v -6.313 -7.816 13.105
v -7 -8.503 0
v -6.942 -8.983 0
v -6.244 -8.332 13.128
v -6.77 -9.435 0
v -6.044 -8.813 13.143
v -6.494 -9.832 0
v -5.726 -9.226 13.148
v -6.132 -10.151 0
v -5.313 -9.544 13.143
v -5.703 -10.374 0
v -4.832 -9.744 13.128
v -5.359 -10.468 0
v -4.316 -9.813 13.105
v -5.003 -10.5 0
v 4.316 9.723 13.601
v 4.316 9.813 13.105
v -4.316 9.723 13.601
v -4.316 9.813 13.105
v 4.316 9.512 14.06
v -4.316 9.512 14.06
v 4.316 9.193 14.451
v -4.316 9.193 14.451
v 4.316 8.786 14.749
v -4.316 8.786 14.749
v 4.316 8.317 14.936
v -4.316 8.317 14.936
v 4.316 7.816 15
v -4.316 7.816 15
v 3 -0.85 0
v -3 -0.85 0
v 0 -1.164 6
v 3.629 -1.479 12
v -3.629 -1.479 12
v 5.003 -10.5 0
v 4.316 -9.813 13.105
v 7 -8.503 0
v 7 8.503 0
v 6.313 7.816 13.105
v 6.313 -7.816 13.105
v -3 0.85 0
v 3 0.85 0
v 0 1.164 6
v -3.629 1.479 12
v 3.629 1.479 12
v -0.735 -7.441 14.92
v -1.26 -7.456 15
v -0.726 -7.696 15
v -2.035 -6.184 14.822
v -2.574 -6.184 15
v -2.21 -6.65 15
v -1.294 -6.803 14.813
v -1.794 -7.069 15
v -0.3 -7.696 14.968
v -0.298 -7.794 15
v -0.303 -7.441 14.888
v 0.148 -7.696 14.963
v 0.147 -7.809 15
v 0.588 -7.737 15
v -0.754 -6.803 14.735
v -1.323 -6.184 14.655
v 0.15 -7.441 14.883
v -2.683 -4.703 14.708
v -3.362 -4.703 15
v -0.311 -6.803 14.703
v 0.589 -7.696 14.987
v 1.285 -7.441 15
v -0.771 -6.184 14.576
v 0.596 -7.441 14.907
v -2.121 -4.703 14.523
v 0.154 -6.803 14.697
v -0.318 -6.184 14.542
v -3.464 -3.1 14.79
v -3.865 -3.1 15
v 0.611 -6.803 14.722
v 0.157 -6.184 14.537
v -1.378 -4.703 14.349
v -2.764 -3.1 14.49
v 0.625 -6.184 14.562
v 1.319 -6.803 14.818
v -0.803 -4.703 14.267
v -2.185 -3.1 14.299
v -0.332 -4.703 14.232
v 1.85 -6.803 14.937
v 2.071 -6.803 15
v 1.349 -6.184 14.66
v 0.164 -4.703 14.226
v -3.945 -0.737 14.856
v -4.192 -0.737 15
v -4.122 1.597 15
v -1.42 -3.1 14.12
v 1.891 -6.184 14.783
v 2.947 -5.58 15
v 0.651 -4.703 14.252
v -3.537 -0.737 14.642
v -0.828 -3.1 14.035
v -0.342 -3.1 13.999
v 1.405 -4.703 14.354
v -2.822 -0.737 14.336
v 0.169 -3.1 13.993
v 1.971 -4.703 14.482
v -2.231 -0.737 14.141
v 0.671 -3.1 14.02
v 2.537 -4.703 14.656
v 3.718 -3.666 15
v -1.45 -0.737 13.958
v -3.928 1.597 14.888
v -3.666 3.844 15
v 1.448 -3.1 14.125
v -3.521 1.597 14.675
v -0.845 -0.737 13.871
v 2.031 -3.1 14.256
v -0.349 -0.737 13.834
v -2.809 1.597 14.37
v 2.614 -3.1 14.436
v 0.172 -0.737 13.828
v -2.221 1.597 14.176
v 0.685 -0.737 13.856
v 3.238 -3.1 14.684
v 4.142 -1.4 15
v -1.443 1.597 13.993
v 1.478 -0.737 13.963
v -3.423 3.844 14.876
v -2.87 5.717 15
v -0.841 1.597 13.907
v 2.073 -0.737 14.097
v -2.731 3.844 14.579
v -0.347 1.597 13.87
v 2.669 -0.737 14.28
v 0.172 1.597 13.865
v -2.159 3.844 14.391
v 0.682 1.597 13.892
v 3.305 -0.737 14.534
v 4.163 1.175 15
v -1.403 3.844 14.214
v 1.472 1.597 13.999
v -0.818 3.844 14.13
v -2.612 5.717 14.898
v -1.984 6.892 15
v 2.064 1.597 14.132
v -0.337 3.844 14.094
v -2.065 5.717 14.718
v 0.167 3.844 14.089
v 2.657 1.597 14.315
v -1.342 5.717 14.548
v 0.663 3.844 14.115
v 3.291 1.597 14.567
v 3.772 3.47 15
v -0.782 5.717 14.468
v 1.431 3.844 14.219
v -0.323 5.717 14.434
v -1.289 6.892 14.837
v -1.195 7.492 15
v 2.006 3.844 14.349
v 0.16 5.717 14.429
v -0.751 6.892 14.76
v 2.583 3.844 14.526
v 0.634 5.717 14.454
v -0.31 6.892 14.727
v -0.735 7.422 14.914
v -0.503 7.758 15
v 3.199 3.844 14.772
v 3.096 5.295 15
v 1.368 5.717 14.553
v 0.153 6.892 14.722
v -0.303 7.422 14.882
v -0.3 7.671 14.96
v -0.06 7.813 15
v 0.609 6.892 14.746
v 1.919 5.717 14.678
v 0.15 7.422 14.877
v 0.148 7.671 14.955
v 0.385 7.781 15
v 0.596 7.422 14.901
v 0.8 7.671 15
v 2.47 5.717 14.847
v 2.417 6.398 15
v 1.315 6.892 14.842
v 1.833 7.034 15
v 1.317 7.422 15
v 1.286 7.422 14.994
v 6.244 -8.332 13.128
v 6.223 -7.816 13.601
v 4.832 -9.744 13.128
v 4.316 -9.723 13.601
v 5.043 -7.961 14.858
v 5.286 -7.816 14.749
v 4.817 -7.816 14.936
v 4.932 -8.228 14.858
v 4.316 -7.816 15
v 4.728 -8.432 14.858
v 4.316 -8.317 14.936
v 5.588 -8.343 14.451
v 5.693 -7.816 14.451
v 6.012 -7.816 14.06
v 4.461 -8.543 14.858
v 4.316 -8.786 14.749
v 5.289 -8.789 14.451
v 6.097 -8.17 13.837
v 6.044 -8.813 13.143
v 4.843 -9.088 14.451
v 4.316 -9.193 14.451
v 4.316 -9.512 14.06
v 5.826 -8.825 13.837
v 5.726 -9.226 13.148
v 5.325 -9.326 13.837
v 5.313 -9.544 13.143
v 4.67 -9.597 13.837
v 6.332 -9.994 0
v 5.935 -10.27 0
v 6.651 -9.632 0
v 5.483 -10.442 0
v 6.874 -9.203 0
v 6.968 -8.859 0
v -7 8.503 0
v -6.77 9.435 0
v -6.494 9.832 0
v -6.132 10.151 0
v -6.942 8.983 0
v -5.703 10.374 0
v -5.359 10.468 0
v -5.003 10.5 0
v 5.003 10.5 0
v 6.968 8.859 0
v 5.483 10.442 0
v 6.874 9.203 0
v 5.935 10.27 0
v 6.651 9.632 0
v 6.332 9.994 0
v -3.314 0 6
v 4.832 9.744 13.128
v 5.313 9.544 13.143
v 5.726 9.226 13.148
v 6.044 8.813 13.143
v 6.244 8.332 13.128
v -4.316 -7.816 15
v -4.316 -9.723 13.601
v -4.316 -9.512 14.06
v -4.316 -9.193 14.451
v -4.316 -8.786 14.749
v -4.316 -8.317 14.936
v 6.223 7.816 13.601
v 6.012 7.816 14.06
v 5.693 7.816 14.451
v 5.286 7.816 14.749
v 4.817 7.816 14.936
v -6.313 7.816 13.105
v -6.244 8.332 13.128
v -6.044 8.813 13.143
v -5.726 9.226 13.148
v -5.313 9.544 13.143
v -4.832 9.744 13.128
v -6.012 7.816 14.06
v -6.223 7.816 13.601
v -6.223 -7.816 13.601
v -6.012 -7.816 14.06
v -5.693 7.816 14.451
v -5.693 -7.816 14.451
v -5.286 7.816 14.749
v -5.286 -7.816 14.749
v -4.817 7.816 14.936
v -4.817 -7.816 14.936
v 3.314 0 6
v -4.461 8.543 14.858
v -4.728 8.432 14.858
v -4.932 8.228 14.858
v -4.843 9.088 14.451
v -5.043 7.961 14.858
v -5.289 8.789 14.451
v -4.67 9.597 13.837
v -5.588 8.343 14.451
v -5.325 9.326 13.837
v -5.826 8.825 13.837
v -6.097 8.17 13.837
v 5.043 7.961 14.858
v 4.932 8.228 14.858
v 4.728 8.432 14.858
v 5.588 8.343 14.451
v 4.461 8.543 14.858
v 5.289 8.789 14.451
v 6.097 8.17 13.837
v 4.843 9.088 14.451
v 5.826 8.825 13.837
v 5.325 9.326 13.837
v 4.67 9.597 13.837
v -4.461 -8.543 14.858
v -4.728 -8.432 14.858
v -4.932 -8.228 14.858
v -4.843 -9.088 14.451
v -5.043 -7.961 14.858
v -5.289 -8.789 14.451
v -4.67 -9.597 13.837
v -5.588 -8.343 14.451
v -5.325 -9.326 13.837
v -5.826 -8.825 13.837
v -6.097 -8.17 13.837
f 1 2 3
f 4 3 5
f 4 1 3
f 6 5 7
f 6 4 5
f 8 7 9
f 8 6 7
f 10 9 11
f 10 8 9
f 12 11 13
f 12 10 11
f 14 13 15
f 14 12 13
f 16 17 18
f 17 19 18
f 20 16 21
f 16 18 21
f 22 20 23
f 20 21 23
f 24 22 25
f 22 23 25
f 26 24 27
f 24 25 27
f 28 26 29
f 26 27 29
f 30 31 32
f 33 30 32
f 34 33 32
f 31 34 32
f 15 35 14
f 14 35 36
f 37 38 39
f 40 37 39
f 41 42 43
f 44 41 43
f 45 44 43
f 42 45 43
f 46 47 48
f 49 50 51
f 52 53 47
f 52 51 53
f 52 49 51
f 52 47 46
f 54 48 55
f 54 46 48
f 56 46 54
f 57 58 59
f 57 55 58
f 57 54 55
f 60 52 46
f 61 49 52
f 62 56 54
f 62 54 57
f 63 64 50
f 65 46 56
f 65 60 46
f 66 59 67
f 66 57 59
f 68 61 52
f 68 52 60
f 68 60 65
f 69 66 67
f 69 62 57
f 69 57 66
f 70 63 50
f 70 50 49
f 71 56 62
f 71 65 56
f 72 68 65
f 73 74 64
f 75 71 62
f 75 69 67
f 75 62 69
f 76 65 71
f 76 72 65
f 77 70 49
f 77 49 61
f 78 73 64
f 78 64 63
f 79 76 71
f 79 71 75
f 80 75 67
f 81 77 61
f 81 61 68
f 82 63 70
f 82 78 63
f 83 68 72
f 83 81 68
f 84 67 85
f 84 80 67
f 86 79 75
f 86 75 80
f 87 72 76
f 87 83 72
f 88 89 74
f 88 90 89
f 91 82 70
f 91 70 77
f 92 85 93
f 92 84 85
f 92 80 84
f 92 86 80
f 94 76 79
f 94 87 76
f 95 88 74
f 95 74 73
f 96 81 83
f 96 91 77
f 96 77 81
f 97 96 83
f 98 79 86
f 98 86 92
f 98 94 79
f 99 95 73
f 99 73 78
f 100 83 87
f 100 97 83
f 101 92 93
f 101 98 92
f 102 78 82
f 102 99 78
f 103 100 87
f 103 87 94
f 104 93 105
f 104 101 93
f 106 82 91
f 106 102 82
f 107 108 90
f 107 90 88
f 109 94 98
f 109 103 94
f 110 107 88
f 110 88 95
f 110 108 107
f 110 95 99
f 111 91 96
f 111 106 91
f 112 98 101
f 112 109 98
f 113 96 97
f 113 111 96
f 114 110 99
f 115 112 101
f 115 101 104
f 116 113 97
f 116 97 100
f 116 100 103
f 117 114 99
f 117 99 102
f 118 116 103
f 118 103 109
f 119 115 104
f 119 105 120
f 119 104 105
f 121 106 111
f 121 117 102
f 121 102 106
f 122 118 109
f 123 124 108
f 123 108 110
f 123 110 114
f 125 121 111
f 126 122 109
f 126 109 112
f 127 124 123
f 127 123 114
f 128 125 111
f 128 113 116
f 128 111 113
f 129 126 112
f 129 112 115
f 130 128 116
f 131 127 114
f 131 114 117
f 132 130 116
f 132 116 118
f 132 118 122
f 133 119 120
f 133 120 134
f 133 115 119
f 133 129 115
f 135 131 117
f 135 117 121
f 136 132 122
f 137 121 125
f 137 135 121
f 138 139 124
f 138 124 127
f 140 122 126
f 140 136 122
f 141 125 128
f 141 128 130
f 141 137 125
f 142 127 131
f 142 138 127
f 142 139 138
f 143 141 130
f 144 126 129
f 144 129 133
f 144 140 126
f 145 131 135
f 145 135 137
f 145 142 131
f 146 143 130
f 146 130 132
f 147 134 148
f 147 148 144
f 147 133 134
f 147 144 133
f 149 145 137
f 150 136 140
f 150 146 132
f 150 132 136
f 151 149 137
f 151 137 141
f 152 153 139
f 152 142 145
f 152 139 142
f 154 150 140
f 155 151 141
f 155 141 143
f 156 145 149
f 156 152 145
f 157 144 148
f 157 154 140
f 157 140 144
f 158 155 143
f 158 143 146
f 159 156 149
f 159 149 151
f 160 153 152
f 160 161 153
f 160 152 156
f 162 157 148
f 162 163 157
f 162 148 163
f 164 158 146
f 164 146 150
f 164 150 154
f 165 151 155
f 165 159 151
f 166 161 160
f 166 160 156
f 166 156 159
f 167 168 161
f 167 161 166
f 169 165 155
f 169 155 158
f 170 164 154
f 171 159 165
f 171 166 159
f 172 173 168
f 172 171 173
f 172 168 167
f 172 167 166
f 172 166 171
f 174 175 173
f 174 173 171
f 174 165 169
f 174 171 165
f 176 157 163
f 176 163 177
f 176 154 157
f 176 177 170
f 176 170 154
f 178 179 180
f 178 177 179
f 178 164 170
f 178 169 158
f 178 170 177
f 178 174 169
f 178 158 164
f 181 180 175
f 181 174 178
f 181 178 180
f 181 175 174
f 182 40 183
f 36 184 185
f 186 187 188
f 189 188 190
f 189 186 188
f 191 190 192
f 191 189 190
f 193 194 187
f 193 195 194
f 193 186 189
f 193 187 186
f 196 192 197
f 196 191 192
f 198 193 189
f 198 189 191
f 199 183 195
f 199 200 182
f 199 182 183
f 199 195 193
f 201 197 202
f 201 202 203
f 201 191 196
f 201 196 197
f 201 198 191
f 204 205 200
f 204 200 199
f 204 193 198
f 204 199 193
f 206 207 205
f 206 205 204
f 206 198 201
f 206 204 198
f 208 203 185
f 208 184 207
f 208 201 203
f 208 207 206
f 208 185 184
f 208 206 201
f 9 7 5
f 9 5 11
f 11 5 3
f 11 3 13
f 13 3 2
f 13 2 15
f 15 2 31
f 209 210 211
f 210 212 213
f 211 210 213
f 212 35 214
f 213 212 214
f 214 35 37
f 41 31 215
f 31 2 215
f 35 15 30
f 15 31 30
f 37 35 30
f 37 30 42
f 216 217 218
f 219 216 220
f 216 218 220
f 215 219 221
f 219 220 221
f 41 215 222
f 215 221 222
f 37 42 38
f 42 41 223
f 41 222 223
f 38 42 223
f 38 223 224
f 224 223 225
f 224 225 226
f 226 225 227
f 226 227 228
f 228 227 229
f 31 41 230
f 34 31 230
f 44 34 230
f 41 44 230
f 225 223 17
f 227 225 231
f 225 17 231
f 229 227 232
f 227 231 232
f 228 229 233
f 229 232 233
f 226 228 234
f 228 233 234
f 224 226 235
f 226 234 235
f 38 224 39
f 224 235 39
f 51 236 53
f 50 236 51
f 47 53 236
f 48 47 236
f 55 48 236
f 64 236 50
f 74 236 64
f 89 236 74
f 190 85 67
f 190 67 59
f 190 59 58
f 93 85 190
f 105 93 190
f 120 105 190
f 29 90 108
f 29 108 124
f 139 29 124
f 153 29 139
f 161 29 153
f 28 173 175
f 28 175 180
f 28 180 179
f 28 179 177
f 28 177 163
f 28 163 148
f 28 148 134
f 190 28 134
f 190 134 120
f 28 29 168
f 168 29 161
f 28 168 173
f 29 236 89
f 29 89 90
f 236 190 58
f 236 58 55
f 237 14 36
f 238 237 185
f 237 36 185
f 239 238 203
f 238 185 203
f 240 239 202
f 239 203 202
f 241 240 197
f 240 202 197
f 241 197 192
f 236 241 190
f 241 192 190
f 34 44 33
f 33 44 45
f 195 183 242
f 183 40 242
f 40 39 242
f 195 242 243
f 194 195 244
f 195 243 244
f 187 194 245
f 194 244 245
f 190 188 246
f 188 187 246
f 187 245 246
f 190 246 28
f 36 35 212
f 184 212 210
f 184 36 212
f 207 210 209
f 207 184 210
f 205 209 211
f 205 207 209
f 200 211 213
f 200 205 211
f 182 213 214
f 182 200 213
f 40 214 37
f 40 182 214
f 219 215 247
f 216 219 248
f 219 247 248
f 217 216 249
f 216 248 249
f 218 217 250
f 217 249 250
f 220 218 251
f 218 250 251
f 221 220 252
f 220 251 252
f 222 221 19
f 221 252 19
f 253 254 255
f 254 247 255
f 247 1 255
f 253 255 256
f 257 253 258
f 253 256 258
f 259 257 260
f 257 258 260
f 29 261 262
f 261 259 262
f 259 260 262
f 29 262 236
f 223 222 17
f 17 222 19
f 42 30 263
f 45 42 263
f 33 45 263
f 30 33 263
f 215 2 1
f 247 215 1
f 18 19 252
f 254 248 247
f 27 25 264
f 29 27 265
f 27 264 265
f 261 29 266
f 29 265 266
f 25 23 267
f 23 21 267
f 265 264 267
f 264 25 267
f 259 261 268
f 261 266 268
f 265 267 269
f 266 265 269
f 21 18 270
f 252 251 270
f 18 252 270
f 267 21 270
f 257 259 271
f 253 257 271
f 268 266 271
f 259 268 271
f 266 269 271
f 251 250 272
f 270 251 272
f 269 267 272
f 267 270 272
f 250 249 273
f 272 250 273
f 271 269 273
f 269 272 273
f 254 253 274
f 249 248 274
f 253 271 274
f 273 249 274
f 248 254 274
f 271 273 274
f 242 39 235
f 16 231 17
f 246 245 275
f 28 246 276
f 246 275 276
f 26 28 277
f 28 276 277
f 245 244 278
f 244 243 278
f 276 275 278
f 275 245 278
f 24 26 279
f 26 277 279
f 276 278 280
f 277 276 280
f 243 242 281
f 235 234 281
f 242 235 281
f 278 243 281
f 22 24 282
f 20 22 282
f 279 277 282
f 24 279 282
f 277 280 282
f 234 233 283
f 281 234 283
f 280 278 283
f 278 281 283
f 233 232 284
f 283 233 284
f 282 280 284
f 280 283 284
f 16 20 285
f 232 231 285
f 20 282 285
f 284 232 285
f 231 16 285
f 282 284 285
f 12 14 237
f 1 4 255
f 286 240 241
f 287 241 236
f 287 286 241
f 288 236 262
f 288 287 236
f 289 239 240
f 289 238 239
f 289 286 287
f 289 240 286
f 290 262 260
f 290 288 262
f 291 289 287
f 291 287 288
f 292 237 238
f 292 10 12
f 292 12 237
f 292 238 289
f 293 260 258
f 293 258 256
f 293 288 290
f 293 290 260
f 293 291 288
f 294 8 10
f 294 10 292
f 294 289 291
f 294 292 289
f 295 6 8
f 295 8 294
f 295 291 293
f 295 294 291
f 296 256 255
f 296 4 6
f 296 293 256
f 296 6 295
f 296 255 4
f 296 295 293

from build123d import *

# Parameters (mm, degrees)
F0_W     = 14
F0_H     = 21
F0_W_2   = 6
F0_H_2   = 1.7
F1_DEPTH = 15
F1_TAPER = 3
F2_DEPTH = 12
F2_TAPER = -3
F3_R     = 2


with BuildPart() as f1:
    # F0 (on Top) → F1 (new body)
    with BuildSketch(Plane.XY):
        Rectangle(F0_W, F0_H)
        Rectangle(F0_W_2, F0_H_2, mode=Mode.SUBTRACT)
        Rectangle(F0_W_2, F0_H_2)
    extrude(amount=F1_DEPTH, taper=F1_TAPER)

    # F0 (on Top) → F2 (cut)
    with BuildSketch(Plane.XY):
        Rectangle(F0_W_2, F0_H_2)
    extrude(amount=F2_DEPTH, taper=F2_TAPER, mode=Mode.SUBTRACT)

    # F3
    f3_edges = [f1.edges().sort_by_distance(p)[0] for p in [
        (-6.606942, 10.106942, 7.5),
        (-6.606942, -10.106942, 7.5),
        (6.606942, 10.106942, 7.5),
        (6.606942, -10.106942, 7.5),
        (6.213883, 0, 15),
        (0, -9.713883, 15),
        (0, 9.713883, 15),
        (-6.213883, 0, 15),
    ]]
    fillet(f3_edges, radius=F3_R)


with BuildPart() as f5:
    # F4 (on Top) → F5 (revolve)
    with BuildSketch(Plane.XY):
        with BuildLine():
            Line((0, 15), (0, -15))
            add(Edge.make_bspline(
                [(0, -15), (8.0832192465, -15), (8.0832192465, 0), (8.0832192465, 15), (0, 15)],
                knots=[3.1415926536, 3.1415926536, 3.1415926536, 4.7123889804, 4.7123889804, 6.2831853072, 6.2831853072, 6.2831853072], degree=2, weights=[1, 0.7071067812, 1, 0.7071067812, 1]))
        make_face()
    revolve(axis=Axis((0, -0.4179980606, 0), (0, -1, 0)))


with BuildPart() as f5_1:
    # F6: moved
    add(f5.part.moved(Location((0, 0, 21.9))))


with BuildPart() as f1_1:
    add(f1.part)

    # F7: cut F5
    add(f5_1.part, mode=Mode.SUBTRACT)


solid = f1_1.part
